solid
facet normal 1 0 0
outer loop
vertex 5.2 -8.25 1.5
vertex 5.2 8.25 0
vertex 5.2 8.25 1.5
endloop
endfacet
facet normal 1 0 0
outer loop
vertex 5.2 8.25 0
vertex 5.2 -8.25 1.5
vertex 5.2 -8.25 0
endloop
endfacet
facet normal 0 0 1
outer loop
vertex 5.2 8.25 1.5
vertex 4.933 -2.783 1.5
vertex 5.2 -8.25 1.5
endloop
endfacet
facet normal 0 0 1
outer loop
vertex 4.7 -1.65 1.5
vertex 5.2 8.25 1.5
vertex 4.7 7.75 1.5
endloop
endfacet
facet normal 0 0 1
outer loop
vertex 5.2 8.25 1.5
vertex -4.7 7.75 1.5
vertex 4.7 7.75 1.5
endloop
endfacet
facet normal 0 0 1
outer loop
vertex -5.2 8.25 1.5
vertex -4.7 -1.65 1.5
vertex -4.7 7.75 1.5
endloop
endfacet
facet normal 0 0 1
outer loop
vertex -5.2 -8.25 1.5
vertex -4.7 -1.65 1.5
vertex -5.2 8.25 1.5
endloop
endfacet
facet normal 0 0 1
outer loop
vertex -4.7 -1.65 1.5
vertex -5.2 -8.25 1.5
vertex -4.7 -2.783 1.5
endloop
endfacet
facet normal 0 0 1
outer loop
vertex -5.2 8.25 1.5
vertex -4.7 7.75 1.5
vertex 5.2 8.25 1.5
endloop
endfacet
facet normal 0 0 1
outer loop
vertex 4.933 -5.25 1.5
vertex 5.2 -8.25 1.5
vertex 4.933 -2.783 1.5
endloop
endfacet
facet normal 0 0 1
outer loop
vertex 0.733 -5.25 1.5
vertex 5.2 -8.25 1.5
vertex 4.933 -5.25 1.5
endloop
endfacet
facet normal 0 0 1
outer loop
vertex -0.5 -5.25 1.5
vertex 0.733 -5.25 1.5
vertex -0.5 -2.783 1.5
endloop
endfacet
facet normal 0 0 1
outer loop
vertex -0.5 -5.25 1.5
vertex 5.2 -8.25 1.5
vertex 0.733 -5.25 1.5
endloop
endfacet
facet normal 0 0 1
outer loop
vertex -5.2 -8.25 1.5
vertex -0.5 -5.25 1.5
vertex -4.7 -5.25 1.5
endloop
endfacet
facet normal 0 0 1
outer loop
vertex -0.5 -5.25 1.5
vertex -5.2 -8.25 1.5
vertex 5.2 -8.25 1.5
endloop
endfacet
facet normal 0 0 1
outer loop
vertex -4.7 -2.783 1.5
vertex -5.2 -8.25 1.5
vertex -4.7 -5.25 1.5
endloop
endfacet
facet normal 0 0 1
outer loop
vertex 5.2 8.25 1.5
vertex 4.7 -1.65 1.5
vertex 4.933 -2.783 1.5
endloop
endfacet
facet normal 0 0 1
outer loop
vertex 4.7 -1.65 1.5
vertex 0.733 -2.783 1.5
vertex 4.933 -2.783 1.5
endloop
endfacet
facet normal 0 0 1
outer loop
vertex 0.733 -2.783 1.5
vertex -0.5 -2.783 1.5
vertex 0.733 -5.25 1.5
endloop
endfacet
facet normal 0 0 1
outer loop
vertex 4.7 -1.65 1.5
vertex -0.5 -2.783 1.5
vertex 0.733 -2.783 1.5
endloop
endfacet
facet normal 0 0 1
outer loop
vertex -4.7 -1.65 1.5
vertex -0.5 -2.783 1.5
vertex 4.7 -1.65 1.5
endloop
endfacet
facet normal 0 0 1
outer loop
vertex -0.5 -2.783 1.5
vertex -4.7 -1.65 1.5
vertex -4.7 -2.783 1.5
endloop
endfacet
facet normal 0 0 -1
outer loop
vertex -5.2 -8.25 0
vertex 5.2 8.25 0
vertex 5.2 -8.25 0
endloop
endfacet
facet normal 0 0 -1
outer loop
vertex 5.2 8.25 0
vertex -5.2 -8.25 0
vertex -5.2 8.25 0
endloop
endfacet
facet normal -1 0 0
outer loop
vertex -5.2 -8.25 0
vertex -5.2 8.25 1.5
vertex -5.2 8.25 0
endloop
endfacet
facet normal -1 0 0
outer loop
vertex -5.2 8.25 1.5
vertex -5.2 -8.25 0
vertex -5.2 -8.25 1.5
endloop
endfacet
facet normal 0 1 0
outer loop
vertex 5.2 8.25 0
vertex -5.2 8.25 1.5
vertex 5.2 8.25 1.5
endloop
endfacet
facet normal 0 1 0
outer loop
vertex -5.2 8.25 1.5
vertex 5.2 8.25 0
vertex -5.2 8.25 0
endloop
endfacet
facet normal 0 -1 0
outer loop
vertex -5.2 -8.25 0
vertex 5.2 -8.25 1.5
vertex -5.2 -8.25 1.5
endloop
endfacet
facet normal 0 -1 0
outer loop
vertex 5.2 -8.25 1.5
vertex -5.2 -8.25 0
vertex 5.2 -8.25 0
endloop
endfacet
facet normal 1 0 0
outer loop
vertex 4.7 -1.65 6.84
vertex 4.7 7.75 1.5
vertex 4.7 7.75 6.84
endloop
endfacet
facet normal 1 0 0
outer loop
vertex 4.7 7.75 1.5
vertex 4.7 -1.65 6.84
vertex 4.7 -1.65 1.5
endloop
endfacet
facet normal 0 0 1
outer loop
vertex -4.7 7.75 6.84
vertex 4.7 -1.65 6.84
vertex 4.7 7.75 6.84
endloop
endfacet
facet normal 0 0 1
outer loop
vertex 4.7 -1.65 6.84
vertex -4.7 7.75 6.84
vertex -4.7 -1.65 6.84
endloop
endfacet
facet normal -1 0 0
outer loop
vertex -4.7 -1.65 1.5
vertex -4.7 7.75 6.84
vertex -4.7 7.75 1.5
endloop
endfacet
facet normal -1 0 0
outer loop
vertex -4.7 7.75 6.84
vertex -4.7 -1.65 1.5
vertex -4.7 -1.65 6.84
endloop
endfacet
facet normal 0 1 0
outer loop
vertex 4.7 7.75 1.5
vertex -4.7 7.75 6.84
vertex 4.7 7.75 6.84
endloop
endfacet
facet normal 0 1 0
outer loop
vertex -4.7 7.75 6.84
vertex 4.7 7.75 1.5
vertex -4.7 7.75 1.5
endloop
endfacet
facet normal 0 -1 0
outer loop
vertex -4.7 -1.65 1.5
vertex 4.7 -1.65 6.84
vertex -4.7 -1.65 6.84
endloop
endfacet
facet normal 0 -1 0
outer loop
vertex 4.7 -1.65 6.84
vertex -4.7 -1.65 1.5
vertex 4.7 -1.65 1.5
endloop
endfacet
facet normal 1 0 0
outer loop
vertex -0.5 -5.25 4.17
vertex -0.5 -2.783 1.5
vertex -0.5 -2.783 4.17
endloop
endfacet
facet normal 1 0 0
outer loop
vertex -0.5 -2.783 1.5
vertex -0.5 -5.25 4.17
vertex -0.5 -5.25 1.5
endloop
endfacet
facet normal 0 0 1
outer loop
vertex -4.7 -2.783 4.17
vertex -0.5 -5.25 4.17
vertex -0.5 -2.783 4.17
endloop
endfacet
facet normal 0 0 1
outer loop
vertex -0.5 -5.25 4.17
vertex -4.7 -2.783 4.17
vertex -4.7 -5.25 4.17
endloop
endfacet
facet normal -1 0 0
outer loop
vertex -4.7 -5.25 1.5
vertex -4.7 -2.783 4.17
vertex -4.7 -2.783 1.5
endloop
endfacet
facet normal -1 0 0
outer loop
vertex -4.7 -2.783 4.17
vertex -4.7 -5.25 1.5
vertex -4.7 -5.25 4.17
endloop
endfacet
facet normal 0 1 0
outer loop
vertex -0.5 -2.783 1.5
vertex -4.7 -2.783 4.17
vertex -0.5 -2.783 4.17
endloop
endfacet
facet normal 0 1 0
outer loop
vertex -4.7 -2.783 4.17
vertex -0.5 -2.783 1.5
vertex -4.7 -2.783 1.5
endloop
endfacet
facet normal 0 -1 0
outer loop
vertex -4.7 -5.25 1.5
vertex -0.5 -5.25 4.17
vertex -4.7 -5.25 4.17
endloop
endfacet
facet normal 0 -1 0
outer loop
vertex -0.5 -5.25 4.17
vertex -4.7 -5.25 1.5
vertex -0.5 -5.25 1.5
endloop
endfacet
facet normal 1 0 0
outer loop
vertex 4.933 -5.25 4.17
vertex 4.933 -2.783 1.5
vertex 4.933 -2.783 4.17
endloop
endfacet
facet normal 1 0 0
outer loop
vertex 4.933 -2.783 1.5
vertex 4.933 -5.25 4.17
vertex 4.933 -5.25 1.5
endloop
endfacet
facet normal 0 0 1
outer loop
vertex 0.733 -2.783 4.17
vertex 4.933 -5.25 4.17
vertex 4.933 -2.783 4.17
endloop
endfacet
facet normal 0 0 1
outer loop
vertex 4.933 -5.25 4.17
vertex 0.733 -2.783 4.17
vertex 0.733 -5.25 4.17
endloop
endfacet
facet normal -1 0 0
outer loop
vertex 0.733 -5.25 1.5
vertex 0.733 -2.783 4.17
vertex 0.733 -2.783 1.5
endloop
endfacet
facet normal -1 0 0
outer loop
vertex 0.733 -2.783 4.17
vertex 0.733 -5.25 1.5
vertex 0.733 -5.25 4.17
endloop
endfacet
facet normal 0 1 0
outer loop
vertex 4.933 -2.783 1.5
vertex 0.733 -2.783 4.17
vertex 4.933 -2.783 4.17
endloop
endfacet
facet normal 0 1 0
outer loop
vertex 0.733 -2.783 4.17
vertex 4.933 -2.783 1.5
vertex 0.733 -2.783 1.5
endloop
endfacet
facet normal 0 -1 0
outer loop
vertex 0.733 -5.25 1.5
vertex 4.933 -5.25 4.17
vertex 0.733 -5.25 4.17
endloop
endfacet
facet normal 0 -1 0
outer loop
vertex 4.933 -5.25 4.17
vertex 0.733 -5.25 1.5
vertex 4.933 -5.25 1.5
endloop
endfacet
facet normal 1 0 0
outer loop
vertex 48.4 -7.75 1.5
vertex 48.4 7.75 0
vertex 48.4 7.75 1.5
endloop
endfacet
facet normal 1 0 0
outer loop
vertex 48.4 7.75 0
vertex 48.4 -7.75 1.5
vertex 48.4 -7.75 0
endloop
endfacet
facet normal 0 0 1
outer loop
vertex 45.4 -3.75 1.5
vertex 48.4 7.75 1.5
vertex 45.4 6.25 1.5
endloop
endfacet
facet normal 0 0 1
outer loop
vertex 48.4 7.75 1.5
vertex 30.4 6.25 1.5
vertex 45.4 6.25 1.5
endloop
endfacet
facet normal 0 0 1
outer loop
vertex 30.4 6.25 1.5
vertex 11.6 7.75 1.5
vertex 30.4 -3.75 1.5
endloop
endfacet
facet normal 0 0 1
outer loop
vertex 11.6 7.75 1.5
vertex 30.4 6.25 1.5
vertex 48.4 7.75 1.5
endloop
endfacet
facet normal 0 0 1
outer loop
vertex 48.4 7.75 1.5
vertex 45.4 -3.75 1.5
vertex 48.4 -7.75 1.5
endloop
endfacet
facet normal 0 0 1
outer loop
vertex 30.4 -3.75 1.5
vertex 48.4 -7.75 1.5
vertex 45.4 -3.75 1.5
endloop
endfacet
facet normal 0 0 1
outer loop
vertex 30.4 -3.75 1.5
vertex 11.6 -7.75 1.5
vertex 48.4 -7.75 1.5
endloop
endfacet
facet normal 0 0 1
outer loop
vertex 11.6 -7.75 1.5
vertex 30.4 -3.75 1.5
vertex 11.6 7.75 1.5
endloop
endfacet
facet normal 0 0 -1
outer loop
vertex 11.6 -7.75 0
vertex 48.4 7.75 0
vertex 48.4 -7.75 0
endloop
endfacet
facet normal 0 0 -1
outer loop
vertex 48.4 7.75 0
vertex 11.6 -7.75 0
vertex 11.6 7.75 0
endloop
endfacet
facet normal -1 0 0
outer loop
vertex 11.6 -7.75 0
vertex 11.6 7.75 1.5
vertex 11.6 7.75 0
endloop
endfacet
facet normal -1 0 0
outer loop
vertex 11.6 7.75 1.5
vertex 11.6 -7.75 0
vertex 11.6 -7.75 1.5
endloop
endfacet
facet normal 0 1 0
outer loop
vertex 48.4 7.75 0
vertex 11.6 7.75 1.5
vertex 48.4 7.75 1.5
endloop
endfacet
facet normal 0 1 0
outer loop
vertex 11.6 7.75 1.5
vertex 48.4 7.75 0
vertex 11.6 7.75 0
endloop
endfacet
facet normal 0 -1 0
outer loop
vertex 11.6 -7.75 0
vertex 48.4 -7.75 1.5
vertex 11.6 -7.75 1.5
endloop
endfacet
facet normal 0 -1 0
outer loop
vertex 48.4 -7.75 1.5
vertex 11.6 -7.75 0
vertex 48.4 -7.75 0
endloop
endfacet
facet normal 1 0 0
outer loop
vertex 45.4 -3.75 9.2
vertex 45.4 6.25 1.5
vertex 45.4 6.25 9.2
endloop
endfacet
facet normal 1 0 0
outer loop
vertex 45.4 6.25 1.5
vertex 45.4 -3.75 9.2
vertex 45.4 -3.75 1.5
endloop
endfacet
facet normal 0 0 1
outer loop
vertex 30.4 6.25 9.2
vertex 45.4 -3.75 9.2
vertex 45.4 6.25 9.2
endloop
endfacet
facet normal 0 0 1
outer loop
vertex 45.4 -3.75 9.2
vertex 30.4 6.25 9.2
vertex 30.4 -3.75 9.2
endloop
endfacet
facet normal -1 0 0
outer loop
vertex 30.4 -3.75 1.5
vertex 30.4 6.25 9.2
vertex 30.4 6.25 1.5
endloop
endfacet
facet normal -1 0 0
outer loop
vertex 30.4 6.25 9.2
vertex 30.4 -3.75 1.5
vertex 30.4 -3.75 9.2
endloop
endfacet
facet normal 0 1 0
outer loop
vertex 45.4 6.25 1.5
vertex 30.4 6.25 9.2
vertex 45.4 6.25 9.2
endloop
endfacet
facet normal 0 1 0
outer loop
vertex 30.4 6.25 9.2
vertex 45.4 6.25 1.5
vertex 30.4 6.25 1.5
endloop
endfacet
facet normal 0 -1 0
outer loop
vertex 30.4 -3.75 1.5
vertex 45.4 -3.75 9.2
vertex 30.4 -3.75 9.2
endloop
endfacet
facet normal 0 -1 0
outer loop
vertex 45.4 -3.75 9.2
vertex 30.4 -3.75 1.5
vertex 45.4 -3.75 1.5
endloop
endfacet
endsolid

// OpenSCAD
// file: ../pcb.scad
/**
 * Available PCB's:
 * 
 * + Naos Raptor 10A: https://media.digikey.com/pdf/Data%20Sheets/Lineage%20Power/Naos_Raptor_10A.pdf
 * + Naos Raptor 10A: http://apps.geindustrial.com/publibrary/checkout/NSR020A0X?TNR=Data%20Sheets|NSR020A0X|generic
 */

//pcb("raptor10a");
//pcb("raptor20a");

module pcb(type, holes=true) {
  if(type == "raptor10a")
    raptor10a(holes);

  if(type == "raptor20a")
      raptor20a(holes);
}

module raptor20a() {
  length= 36.8;
  width = 15.5;
  height = 9.2;

  pcbHeight = 1.5;
  componentHeight = height - pcbHeight;

  translate([-length / 2, -width / 2, 0])
    group() {
      color("green")
        cube([length, width, pcbHeight]);

      translate([length -15 -3, width - 11.5, pcbHeight])
        color("black")
          cube([15, 10, componentHeight]);
    }
}

module raptor10a() {
  length= 10.4;
  width = 16.5;
  height = 6.84;
  
  pcbHeight = 1.5;
  componentHeight = height - pcbHeight;
  
  translate([-length / 2, -width / 2, 0])
    group() {
      color("green")
        cube([length, width, pcbHeight]);
      
      translate([0.5, width - length + 0.5  , pcbHeight])
        color("black")
          cube([length - 1, length - 1, componentHeight]);
      
      translate([0.5, 3, pcbHeight])
        color("brown")
          cube([(length) / 2 - 1, (length / 3) - 1, componentHeight / 2]);
      
      translate([length - (length / 3) - 1 , 3, pcbHeight])
        color("brown")
          cube([(length) / 2 - 1, (length / 3) - 1, componentHeight / 2]);
    }
}
// main file
include <../pcb.scad>;

raptor10a();

translate([5, -40, 0])
  rotate([0, 0, 90])
    color("black")
      text("10A");

translate([30, 0, 0])
  raptor20a();

translate([35, -40, 0])
  rotate([0, 0, 90])
    color("black")
      text("20A");
